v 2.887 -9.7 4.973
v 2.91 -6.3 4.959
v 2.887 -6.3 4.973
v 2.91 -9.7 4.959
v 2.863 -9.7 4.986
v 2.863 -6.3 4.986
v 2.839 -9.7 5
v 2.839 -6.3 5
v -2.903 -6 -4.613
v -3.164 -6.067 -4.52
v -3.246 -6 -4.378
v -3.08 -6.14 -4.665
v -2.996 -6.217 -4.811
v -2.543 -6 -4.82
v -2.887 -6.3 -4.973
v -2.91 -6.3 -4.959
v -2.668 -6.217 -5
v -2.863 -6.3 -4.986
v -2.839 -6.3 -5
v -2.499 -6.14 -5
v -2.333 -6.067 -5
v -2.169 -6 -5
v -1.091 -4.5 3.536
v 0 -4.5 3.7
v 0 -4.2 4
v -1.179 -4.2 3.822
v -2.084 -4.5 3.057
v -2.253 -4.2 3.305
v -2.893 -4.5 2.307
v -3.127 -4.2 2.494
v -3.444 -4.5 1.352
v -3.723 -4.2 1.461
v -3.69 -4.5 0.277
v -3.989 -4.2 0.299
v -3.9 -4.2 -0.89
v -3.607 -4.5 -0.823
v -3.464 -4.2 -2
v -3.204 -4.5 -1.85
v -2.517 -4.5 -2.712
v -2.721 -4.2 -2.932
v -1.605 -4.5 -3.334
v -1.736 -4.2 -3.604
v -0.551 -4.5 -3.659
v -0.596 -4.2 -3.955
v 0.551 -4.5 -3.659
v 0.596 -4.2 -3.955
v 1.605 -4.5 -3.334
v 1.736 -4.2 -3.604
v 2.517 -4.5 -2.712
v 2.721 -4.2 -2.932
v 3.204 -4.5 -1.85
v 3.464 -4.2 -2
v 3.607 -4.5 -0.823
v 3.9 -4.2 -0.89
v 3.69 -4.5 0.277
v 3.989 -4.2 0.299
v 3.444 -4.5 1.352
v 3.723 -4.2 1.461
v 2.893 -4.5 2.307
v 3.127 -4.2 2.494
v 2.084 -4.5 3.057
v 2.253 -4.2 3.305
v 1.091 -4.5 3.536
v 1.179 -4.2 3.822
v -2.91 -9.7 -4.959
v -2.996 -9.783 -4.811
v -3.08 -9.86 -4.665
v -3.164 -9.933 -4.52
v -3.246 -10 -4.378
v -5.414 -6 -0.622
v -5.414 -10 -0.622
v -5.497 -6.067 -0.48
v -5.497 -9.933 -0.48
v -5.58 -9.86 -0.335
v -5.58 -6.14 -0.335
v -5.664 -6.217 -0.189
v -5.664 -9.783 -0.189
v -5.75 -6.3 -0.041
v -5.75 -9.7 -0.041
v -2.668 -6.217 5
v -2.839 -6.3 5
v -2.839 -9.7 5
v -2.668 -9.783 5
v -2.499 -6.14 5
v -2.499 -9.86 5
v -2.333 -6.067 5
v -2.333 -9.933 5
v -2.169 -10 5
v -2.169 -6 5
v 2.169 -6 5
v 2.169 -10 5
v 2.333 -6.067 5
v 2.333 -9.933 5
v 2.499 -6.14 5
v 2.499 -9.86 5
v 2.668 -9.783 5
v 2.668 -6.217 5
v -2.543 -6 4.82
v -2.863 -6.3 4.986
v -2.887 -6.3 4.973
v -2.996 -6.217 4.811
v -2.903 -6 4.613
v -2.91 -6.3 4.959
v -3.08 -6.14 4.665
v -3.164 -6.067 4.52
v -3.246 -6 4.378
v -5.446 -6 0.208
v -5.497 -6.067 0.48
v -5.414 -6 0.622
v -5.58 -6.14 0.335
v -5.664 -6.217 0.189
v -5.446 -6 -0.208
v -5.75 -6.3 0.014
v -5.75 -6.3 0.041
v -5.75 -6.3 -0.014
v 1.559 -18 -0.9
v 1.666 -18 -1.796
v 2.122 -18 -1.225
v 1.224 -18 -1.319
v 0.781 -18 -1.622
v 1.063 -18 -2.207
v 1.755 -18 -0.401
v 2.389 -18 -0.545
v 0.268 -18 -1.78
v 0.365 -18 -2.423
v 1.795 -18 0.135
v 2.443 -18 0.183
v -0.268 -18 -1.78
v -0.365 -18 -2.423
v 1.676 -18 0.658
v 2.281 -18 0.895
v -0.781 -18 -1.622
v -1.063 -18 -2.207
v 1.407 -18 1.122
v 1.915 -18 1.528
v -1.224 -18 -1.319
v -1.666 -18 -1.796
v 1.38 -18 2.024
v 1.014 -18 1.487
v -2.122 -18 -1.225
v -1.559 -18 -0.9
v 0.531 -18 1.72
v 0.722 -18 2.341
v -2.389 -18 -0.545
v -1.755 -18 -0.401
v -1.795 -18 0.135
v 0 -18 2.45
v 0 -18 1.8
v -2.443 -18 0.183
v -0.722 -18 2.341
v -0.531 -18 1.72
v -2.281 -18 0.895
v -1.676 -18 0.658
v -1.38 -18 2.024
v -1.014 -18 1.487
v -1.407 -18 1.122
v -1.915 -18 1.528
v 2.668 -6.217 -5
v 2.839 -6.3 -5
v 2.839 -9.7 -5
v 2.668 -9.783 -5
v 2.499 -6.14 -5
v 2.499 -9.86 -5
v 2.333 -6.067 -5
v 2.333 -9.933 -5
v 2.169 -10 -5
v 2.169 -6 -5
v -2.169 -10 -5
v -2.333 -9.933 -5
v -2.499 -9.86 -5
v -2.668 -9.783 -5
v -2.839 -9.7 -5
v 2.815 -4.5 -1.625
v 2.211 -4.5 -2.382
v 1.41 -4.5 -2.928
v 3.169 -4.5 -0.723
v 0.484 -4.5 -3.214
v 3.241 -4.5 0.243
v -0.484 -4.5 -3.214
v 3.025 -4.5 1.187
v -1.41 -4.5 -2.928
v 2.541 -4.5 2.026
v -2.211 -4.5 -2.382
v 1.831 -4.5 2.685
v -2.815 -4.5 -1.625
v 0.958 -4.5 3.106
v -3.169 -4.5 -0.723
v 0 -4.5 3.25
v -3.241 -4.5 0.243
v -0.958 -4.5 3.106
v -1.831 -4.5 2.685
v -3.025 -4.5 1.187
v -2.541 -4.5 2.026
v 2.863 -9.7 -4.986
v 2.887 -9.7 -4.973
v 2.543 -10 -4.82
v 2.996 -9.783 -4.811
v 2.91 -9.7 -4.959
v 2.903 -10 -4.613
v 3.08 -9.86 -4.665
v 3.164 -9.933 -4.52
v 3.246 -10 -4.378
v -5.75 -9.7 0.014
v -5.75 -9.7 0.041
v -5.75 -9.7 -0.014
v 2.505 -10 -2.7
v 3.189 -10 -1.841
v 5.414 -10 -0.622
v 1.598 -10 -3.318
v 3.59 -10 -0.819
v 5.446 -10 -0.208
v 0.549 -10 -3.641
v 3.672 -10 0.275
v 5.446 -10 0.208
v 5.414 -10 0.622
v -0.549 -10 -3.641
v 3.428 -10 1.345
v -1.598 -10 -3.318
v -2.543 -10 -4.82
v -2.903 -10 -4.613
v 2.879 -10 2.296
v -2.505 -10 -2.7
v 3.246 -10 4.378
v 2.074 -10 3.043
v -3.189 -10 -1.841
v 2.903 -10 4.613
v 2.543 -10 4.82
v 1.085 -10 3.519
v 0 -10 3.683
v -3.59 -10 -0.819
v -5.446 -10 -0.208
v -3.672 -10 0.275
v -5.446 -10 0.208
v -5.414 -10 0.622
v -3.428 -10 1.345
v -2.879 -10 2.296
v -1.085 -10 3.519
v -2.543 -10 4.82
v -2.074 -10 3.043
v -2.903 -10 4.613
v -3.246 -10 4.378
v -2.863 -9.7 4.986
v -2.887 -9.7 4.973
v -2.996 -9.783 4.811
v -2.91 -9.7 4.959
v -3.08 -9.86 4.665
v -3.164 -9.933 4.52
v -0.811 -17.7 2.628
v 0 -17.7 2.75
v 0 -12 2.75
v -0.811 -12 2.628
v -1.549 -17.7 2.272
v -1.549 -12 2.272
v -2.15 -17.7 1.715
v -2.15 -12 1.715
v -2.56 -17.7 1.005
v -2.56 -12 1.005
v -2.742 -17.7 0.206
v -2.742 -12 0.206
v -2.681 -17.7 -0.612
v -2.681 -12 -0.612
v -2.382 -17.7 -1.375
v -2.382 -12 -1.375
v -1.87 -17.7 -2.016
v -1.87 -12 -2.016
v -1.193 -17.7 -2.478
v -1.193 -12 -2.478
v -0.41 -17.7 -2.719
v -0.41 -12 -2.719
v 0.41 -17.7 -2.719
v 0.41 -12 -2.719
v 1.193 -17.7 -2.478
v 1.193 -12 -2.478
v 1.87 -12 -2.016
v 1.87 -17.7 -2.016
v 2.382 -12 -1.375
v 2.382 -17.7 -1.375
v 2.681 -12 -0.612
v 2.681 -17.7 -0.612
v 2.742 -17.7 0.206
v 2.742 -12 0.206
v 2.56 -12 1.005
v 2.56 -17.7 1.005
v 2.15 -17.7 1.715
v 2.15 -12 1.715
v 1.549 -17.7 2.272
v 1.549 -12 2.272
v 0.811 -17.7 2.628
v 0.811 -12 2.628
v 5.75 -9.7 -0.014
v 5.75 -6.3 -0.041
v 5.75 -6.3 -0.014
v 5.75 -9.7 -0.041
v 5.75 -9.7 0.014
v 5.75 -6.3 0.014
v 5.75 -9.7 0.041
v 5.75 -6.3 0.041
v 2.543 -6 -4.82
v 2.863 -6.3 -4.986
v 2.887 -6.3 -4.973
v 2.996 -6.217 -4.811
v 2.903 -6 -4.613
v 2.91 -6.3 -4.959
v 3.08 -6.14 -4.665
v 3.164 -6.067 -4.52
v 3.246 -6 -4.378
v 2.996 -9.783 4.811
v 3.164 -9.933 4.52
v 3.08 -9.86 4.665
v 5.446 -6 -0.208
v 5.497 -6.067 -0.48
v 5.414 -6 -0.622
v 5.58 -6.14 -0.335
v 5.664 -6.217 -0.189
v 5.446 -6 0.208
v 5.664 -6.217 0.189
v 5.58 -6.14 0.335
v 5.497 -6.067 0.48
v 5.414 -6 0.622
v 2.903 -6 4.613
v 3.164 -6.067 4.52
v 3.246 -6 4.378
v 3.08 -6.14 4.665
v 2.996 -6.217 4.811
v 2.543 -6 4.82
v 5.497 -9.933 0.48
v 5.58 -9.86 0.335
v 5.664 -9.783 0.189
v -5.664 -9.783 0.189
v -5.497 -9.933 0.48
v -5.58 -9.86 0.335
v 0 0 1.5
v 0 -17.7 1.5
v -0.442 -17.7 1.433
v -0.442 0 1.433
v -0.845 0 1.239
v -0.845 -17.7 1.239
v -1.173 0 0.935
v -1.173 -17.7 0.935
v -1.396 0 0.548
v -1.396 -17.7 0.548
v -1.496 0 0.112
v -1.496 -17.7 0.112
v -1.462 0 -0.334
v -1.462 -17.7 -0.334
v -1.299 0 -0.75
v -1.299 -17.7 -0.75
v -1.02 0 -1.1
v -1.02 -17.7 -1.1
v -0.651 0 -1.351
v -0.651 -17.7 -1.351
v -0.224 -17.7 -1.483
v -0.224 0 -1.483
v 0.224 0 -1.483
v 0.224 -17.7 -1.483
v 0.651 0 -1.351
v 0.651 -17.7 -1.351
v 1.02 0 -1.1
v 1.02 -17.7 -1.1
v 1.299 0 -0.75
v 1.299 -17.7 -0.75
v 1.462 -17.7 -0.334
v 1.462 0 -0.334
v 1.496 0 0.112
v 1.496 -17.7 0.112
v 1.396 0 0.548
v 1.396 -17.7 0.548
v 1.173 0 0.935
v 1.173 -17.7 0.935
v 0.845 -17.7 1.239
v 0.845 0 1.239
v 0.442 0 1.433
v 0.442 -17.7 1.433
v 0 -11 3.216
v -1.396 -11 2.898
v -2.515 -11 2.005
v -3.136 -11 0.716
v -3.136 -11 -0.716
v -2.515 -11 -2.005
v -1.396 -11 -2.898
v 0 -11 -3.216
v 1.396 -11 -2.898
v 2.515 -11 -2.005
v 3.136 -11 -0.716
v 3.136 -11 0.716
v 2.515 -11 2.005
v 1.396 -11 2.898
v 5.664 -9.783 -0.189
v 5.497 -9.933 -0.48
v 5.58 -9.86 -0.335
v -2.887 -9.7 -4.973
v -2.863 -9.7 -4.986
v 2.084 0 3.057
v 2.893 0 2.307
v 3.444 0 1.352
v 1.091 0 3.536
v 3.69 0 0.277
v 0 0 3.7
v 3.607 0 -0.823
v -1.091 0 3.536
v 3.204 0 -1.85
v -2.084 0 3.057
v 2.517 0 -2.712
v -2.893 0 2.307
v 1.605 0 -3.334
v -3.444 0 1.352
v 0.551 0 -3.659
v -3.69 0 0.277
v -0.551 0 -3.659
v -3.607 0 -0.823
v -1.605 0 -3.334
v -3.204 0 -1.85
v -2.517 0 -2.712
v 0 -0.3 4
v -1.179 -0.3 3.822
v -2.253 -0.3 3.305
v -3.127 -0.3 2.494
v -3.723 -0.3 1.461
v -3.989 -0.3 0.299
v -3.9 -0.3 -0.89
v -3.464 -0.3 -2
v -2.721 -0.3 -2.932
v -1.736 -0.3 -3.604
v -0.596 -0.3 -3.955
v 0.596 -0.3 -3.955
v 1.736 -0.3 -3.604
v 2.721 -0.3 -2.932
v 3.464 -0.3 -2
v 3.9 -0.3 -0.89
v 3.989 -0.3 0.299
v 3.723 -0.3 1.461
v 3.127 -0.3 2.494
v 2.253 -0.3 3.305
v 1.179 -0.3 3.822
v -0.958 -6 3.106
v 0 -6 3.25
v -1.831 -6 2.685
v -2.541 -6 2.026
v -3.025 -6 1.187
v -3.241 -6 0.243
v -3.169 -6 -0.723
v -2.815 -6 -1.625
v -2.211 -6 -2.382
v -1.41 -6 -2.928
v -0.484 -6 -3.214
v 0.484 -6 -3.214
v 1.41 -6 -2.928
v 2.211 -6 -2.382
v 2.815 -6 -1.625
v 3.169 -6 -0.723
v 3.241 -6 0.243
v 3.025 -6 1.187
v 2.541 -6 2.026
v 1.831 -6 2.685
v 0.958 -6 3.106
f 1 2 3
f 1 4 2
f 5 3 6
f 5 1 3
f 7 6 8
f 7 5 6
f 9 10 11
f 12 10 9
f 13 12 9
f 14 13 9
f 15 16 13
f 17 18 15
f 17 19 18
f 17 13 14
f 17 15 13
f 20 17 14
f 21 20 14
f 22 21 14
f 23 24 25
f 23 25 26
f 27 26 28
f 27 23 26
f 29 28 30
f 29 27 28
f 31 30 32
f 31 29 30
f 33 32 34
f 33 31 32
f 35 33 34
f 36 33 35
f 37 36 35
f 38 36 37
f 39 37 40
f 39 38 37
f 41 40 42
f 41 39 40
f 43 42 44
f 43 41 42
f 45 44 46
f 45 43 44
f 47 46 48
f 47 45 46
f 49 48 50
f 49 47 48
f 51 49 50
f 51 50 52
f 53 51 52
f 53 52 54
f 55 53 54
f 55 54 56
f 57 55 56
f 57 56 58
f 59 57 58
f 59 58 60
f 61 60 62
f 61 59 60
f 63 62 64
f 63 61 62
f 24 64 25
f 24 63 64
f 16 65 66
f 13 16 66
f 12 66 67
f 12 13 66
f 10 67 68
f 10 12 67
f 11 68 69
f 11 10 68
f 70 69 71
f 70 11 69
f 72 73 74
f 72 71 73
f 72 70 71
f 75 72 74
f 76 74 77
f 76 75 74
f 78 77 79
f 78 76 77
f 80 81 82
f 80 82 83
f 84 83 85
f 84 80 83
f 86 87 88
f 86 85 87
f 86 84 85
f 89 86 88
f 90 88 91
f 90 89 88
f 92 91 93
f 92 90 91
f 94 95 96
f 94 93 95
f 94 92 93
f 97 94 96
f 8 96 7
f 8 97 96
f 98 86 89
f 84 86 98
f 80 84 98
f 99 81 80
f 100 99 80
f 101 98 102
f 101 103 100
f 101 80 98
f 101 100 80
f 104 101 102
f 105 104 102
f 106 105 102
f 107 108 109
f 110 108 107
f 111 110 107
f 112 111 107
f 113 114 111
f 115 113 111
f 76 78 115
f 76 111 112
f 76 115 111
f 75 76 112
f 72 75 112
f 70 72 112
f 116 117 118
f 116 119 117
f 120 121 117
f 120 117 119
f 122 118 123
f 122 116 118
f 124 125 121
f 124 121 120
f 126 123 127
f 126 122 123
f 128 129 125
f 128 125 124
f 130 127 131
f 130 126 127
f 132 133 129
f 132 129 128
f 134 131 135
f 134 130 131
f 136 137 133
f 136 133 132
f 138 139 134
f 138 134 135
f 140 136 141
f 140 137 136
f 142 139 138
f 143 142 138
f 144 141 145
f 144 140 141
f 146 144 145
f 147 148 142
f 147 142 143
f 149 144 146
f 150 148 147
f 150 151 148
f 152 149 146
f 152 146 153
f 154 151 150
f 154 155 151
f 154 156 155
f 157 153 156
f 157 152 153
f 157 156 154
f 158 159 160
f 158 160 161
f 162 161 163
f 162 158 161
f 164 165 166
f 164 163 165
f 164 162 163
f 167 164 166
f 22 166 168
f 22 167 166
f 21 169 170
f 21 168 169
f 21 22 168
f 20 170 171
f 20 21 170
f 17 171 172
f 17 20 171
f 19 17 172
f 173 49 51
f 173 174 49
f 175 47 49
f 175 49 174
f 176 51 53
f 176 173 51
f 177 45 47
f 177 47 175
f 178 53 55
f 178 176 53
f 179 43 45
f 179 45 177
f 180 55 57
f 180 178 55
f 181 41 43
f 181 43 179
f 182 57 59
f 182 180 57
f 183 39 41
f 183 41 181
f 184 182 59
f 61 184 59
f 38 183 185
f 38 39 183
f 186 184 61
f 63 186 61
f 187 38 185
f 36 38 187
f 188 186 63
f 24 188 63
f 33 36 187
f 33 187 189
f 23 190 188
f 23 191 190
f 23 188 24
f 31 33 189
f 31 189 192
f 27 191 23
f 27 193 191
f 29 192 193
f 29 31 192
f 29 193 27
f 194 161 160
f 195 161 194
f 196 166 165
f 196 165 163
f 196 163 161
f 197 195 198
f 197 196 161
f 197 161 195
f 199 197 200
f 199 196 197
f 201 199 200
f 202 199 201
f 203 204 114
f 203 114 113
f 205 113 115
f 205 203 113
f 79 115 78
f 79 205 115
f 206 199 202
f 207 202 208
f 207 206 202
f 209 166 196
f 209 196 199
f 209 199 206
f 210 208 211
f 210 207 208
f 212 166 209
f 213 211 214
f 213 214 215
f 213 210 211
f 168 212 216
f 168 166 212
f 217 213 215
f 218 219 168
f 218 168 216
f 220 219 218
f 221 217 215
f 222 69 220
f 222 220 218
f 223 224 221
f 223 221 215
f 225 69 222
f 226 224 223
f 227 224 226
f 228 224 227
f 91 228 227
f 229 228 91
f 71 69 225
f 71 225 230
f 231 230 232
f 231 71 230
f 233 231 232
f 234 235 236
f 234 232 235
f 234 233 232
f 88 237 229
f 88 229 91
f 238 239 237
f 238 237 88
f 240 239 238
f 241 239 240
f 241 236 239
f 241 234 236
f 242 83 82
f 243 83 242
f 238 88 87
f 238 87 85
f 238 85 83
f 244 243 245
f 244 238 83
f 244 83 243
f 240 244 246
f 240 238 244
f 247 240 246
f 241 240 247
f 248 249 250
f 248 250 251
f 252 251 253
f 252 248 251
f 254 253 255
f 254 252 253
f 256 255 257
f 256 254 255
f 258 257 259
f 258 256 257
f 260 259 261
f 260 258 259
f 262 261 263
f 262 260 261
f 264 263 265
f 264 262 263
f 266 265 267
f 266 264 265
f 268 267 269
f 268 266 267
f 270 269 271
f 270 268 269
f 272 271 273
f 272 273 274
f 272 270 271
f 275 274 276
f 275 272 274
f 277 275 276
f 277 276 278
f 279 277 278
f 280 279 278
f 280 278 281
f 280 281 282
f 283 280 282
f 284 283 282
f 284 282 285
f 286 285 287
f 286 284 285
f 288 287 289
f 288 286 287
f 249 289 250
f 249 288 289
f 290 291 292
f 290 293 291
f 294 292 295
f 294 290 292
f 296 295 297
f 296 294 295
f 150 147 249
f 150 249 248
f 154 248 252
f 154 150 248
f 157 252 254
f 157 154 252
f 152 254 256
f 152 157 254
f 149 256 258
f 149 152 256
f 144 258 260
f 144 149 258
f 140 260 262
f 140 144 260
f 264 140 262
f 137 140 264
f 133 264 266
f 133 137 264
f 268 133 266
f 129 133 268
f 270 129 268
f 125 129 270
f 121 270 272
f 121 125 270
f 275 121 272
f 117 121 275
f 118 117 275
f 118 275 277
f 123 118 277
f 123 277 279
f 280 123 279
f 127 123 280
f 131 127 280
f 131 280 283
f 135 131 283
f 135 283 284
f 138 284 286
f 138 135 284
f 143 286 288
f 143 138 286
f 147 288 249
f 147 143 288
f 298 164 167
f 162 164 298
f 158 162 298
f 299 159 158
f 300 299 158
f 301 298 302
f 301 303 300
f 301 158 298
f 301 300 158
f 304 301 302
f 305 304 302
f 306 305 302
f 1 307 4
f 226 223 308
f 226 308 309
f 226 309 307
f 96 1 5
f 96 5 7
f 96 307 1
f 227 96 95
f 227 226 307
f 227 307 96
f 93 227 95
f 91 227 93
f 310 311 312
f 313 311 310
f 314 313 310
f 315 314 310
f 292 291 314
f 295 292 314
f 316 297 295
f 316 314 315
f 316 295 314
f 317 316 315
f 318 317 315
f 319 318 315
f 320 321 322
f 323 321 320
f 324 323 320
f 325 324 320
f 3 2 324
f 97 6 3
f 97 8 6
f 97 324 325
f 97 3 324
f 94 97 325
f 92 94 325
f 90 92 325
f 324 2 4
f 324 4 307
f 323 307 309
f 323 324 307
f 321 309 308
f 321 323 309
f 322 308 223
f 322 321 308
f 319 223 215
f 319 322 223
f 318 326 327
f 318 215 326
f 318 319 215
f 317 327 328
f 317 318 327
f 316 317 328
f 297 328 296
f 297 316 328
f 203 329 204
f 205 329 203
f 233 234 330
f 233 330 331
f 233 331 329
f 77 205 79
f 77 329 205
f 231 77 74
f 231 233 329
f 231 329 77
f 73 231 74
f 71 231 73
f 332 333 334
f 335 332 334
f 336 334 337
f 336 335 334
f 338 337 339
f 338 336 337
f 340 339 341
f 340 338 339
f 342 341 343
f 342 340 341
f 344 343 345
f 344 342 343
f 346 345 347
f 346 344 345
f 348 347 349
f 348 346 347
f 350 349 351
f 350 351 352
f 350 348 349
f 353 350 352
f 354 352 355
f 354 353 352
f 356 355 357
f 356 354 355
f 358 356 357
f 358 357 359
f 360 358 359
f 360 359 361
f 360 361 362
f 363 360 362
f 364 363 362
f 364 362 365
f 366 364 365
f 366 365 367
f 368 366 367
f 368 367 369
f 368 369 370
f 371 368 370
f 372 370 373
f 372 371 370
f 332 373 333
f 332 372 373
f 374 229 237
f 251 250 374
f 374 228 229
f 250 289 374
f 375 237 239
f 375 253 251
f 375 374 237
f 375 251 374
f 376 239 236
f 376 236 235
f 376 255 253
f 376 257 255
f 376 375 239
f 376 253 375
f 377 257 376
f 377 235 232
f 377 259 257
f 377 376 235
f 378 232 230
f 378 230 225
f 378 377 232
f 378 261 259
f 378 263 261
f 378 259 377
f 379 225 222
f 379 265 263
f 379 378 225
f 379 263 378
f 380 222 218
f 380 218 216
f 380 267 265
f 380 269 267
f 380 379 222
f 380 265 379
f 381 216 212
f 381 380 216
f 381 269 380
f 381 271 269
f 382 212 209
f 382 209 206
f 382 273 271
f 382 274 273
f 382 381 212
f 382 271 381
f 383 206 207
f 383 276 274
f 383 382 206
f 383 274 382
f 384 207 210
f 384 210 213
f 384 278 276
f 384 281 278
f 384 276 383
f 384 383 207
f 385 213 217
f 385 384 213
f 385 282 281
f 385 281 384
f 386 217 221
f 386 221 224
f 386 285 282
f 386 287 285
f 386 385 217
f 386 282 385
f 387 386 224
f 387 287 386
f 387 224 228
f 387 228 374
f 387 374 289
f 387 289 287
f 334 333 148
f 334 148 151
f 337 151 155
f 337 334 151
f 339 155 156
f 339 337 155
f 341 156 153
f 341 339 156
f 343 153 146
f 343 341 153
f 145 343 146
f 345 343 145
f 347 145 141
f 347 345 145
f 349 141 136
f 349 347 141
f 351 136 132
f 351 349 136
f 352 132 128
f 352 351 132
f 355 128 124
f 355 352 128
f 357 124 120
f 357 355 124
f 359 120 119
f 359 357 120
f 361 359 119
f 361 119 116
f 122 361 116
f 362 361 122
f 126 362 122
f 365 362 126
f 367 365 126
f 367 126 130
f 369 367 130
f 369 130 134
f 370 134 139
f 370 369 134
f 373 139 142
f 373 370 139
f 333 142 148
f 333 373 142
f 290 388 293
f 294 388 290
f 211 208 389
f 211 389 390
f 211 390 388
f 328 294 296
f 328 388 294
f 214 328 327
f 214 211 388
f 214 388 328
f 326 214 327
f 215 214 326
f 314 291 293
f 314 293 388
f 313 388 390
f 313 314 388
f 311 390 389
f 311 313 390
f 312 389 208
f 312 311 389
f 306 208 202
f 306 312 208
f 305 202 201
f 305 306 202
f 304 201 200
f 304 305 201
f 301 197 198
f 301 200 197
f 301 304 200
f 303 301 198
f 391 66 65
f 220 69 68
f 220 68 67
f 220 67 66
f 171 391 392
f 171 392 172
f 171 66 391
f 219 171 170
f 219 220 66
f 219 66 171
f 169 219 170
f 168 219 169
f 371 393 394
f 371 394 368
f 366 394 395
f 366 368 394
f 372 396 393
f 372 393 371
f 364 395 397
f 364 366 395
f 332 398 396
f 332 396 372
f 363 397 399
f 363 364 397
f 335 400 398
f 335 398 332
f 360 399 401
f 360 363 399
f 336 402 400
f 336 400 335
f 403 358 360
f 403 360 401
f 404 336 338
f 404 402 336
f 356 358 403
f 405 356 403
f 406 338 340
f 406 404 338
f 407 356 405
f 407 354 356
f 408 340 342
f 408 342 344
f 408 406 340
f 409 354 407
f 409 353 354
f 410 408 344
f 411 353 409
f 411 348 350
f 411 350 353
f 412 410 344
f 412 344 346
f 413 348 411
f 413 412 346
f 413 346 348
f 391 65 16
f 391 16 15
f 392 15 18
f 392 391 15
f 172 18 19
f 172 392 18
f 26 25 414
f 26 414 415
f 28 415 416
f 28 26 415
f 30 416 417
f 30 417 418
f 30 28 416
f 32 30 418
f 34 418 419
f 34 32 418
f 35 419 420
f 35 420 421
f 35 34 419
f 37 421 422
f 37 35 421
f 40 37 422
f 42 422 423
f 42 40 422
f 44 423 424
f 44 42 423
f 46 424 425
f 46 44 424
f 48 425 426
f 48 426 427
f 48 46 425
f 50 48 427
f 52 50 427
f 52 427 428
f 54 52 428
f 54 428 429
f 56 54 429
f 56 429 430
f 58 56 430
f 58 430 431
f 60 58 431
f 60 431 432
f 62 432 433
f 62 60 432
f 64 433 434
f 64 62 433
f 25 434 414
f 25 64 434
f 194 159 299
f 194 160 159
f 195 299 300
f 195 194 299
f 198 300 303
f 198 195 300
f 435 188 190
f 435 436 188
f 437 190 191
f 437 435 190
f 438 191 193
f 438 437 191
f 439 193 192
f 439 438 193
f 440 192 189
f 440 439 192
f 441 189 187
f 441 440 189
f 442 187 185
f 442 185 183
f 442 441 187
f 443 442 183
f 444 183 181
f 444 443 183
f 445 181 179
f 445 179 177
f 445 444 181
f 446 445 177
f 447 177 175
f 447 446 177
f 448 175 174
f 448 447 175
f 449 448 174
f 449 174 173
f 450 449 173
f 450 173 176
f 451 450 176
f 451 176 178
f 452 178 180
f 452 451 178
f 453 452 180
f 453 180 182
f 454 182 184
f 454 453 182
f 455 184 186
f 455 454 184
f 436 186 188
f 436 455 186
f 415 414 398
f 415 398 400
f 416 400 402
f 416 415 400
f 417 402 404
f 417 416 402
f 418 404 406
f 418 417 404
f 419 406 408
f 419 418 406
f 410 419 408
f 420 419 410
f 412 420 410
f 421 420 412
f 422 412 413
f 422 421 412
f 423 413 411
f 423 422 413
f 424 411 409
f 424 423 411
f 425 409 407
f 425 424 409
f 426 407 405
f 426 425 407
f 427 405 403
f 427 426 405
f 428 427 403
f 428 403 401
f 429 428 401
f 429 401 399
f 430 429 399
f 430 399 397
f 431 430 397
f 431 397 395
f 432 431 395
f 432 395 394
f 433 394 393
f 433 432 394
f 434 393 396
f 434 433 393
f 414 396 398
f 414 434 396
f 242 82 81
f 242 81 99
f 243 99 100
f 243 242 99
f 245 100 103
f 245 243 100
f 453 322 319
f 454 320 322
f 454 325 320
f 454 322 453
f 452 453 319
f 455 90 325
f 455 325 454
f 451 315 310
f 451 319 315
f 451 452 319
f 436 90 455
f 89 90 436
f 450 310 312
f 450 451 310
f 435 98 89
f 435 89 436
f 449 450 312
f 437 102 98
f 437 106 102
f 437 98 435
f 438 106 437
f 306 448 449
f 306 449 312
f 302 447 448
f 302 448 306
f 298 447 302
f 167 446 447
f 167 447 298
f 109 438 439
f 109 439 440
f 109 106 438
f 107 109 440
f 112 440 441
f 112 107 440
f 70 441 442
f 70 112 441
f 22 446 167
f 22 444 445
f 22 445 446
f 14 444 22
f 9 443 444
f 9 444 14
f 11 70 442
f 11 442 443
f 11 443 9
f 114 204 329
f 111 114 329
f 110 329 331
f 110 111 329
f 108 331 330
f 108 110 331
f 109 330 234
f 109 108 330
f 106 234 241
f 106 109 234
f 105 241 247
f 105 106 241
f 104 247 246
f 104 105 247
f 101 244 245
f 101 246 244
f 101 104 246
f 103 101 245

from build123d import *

# Parameters (mm, degrees)
CHAMFER_1_SIZE      = 0.3
SKETCH_2_OUTSIDE_W  = 18.352
SKETCH_2_OUTSIDE_H  = 18.352
CUT_EXTRUDE_1_DEPTH = 15.495689014


with BuildPart() as part:
    # Эскиз1 → Повернуть1 (revolve)
    with BuildSketch(Plane.XY):
        Polygon((1.5, 0), (4, 0), (4, -4.5), (3.25, -4.5), (3.25, -6), (5.75, -6), (5.75, -10), (3.682615316, -10), (2.75, -12), (2.75, -18), (1.5, -18), align=None)
    revolve(axis=Axis((0, 8.266911596, 0), (0, -1, 0)))

    # Фаска1
    chamfer_1_edges = [part.edges().sort_by_distance(p)[0] for p in [
        (-5.75, -10, 0),
        (-5.75, -6, 0),
        (-4, -4.5, 0),
        (-4, 0, 0),
        (-1.5, -18, 0),
        (-2.75, -18, 0),
    ]]
    chamfer(chamfer_1_edges, length=CHAMFER_1_SIZE)

    # Эскиз2 outside → Вырез-Вытянуть1 (cut, through all)
    with BuildSketch(Plane(origin=(0, -6, 0), x_dir=(1, 0, 0), z_dir=(0, 1, 0))):
        Rectangle(SKETCH_2_OUTSIDE_W, SKETCH_2_OUTSIDE_H)
        Polygon((5.773502692, 0), (2.886751346, 5), (-2.886751346, 5), (-5.773502692, 0), (-2.886751346, -5), (2.886751346, -5), align=None, mode=Mode.SUBTRACT)
    extrude(amount=-CUT_EXTRUDE_1_DEPTH, mode=Mode.SUBTRACT)


solid = part.part
